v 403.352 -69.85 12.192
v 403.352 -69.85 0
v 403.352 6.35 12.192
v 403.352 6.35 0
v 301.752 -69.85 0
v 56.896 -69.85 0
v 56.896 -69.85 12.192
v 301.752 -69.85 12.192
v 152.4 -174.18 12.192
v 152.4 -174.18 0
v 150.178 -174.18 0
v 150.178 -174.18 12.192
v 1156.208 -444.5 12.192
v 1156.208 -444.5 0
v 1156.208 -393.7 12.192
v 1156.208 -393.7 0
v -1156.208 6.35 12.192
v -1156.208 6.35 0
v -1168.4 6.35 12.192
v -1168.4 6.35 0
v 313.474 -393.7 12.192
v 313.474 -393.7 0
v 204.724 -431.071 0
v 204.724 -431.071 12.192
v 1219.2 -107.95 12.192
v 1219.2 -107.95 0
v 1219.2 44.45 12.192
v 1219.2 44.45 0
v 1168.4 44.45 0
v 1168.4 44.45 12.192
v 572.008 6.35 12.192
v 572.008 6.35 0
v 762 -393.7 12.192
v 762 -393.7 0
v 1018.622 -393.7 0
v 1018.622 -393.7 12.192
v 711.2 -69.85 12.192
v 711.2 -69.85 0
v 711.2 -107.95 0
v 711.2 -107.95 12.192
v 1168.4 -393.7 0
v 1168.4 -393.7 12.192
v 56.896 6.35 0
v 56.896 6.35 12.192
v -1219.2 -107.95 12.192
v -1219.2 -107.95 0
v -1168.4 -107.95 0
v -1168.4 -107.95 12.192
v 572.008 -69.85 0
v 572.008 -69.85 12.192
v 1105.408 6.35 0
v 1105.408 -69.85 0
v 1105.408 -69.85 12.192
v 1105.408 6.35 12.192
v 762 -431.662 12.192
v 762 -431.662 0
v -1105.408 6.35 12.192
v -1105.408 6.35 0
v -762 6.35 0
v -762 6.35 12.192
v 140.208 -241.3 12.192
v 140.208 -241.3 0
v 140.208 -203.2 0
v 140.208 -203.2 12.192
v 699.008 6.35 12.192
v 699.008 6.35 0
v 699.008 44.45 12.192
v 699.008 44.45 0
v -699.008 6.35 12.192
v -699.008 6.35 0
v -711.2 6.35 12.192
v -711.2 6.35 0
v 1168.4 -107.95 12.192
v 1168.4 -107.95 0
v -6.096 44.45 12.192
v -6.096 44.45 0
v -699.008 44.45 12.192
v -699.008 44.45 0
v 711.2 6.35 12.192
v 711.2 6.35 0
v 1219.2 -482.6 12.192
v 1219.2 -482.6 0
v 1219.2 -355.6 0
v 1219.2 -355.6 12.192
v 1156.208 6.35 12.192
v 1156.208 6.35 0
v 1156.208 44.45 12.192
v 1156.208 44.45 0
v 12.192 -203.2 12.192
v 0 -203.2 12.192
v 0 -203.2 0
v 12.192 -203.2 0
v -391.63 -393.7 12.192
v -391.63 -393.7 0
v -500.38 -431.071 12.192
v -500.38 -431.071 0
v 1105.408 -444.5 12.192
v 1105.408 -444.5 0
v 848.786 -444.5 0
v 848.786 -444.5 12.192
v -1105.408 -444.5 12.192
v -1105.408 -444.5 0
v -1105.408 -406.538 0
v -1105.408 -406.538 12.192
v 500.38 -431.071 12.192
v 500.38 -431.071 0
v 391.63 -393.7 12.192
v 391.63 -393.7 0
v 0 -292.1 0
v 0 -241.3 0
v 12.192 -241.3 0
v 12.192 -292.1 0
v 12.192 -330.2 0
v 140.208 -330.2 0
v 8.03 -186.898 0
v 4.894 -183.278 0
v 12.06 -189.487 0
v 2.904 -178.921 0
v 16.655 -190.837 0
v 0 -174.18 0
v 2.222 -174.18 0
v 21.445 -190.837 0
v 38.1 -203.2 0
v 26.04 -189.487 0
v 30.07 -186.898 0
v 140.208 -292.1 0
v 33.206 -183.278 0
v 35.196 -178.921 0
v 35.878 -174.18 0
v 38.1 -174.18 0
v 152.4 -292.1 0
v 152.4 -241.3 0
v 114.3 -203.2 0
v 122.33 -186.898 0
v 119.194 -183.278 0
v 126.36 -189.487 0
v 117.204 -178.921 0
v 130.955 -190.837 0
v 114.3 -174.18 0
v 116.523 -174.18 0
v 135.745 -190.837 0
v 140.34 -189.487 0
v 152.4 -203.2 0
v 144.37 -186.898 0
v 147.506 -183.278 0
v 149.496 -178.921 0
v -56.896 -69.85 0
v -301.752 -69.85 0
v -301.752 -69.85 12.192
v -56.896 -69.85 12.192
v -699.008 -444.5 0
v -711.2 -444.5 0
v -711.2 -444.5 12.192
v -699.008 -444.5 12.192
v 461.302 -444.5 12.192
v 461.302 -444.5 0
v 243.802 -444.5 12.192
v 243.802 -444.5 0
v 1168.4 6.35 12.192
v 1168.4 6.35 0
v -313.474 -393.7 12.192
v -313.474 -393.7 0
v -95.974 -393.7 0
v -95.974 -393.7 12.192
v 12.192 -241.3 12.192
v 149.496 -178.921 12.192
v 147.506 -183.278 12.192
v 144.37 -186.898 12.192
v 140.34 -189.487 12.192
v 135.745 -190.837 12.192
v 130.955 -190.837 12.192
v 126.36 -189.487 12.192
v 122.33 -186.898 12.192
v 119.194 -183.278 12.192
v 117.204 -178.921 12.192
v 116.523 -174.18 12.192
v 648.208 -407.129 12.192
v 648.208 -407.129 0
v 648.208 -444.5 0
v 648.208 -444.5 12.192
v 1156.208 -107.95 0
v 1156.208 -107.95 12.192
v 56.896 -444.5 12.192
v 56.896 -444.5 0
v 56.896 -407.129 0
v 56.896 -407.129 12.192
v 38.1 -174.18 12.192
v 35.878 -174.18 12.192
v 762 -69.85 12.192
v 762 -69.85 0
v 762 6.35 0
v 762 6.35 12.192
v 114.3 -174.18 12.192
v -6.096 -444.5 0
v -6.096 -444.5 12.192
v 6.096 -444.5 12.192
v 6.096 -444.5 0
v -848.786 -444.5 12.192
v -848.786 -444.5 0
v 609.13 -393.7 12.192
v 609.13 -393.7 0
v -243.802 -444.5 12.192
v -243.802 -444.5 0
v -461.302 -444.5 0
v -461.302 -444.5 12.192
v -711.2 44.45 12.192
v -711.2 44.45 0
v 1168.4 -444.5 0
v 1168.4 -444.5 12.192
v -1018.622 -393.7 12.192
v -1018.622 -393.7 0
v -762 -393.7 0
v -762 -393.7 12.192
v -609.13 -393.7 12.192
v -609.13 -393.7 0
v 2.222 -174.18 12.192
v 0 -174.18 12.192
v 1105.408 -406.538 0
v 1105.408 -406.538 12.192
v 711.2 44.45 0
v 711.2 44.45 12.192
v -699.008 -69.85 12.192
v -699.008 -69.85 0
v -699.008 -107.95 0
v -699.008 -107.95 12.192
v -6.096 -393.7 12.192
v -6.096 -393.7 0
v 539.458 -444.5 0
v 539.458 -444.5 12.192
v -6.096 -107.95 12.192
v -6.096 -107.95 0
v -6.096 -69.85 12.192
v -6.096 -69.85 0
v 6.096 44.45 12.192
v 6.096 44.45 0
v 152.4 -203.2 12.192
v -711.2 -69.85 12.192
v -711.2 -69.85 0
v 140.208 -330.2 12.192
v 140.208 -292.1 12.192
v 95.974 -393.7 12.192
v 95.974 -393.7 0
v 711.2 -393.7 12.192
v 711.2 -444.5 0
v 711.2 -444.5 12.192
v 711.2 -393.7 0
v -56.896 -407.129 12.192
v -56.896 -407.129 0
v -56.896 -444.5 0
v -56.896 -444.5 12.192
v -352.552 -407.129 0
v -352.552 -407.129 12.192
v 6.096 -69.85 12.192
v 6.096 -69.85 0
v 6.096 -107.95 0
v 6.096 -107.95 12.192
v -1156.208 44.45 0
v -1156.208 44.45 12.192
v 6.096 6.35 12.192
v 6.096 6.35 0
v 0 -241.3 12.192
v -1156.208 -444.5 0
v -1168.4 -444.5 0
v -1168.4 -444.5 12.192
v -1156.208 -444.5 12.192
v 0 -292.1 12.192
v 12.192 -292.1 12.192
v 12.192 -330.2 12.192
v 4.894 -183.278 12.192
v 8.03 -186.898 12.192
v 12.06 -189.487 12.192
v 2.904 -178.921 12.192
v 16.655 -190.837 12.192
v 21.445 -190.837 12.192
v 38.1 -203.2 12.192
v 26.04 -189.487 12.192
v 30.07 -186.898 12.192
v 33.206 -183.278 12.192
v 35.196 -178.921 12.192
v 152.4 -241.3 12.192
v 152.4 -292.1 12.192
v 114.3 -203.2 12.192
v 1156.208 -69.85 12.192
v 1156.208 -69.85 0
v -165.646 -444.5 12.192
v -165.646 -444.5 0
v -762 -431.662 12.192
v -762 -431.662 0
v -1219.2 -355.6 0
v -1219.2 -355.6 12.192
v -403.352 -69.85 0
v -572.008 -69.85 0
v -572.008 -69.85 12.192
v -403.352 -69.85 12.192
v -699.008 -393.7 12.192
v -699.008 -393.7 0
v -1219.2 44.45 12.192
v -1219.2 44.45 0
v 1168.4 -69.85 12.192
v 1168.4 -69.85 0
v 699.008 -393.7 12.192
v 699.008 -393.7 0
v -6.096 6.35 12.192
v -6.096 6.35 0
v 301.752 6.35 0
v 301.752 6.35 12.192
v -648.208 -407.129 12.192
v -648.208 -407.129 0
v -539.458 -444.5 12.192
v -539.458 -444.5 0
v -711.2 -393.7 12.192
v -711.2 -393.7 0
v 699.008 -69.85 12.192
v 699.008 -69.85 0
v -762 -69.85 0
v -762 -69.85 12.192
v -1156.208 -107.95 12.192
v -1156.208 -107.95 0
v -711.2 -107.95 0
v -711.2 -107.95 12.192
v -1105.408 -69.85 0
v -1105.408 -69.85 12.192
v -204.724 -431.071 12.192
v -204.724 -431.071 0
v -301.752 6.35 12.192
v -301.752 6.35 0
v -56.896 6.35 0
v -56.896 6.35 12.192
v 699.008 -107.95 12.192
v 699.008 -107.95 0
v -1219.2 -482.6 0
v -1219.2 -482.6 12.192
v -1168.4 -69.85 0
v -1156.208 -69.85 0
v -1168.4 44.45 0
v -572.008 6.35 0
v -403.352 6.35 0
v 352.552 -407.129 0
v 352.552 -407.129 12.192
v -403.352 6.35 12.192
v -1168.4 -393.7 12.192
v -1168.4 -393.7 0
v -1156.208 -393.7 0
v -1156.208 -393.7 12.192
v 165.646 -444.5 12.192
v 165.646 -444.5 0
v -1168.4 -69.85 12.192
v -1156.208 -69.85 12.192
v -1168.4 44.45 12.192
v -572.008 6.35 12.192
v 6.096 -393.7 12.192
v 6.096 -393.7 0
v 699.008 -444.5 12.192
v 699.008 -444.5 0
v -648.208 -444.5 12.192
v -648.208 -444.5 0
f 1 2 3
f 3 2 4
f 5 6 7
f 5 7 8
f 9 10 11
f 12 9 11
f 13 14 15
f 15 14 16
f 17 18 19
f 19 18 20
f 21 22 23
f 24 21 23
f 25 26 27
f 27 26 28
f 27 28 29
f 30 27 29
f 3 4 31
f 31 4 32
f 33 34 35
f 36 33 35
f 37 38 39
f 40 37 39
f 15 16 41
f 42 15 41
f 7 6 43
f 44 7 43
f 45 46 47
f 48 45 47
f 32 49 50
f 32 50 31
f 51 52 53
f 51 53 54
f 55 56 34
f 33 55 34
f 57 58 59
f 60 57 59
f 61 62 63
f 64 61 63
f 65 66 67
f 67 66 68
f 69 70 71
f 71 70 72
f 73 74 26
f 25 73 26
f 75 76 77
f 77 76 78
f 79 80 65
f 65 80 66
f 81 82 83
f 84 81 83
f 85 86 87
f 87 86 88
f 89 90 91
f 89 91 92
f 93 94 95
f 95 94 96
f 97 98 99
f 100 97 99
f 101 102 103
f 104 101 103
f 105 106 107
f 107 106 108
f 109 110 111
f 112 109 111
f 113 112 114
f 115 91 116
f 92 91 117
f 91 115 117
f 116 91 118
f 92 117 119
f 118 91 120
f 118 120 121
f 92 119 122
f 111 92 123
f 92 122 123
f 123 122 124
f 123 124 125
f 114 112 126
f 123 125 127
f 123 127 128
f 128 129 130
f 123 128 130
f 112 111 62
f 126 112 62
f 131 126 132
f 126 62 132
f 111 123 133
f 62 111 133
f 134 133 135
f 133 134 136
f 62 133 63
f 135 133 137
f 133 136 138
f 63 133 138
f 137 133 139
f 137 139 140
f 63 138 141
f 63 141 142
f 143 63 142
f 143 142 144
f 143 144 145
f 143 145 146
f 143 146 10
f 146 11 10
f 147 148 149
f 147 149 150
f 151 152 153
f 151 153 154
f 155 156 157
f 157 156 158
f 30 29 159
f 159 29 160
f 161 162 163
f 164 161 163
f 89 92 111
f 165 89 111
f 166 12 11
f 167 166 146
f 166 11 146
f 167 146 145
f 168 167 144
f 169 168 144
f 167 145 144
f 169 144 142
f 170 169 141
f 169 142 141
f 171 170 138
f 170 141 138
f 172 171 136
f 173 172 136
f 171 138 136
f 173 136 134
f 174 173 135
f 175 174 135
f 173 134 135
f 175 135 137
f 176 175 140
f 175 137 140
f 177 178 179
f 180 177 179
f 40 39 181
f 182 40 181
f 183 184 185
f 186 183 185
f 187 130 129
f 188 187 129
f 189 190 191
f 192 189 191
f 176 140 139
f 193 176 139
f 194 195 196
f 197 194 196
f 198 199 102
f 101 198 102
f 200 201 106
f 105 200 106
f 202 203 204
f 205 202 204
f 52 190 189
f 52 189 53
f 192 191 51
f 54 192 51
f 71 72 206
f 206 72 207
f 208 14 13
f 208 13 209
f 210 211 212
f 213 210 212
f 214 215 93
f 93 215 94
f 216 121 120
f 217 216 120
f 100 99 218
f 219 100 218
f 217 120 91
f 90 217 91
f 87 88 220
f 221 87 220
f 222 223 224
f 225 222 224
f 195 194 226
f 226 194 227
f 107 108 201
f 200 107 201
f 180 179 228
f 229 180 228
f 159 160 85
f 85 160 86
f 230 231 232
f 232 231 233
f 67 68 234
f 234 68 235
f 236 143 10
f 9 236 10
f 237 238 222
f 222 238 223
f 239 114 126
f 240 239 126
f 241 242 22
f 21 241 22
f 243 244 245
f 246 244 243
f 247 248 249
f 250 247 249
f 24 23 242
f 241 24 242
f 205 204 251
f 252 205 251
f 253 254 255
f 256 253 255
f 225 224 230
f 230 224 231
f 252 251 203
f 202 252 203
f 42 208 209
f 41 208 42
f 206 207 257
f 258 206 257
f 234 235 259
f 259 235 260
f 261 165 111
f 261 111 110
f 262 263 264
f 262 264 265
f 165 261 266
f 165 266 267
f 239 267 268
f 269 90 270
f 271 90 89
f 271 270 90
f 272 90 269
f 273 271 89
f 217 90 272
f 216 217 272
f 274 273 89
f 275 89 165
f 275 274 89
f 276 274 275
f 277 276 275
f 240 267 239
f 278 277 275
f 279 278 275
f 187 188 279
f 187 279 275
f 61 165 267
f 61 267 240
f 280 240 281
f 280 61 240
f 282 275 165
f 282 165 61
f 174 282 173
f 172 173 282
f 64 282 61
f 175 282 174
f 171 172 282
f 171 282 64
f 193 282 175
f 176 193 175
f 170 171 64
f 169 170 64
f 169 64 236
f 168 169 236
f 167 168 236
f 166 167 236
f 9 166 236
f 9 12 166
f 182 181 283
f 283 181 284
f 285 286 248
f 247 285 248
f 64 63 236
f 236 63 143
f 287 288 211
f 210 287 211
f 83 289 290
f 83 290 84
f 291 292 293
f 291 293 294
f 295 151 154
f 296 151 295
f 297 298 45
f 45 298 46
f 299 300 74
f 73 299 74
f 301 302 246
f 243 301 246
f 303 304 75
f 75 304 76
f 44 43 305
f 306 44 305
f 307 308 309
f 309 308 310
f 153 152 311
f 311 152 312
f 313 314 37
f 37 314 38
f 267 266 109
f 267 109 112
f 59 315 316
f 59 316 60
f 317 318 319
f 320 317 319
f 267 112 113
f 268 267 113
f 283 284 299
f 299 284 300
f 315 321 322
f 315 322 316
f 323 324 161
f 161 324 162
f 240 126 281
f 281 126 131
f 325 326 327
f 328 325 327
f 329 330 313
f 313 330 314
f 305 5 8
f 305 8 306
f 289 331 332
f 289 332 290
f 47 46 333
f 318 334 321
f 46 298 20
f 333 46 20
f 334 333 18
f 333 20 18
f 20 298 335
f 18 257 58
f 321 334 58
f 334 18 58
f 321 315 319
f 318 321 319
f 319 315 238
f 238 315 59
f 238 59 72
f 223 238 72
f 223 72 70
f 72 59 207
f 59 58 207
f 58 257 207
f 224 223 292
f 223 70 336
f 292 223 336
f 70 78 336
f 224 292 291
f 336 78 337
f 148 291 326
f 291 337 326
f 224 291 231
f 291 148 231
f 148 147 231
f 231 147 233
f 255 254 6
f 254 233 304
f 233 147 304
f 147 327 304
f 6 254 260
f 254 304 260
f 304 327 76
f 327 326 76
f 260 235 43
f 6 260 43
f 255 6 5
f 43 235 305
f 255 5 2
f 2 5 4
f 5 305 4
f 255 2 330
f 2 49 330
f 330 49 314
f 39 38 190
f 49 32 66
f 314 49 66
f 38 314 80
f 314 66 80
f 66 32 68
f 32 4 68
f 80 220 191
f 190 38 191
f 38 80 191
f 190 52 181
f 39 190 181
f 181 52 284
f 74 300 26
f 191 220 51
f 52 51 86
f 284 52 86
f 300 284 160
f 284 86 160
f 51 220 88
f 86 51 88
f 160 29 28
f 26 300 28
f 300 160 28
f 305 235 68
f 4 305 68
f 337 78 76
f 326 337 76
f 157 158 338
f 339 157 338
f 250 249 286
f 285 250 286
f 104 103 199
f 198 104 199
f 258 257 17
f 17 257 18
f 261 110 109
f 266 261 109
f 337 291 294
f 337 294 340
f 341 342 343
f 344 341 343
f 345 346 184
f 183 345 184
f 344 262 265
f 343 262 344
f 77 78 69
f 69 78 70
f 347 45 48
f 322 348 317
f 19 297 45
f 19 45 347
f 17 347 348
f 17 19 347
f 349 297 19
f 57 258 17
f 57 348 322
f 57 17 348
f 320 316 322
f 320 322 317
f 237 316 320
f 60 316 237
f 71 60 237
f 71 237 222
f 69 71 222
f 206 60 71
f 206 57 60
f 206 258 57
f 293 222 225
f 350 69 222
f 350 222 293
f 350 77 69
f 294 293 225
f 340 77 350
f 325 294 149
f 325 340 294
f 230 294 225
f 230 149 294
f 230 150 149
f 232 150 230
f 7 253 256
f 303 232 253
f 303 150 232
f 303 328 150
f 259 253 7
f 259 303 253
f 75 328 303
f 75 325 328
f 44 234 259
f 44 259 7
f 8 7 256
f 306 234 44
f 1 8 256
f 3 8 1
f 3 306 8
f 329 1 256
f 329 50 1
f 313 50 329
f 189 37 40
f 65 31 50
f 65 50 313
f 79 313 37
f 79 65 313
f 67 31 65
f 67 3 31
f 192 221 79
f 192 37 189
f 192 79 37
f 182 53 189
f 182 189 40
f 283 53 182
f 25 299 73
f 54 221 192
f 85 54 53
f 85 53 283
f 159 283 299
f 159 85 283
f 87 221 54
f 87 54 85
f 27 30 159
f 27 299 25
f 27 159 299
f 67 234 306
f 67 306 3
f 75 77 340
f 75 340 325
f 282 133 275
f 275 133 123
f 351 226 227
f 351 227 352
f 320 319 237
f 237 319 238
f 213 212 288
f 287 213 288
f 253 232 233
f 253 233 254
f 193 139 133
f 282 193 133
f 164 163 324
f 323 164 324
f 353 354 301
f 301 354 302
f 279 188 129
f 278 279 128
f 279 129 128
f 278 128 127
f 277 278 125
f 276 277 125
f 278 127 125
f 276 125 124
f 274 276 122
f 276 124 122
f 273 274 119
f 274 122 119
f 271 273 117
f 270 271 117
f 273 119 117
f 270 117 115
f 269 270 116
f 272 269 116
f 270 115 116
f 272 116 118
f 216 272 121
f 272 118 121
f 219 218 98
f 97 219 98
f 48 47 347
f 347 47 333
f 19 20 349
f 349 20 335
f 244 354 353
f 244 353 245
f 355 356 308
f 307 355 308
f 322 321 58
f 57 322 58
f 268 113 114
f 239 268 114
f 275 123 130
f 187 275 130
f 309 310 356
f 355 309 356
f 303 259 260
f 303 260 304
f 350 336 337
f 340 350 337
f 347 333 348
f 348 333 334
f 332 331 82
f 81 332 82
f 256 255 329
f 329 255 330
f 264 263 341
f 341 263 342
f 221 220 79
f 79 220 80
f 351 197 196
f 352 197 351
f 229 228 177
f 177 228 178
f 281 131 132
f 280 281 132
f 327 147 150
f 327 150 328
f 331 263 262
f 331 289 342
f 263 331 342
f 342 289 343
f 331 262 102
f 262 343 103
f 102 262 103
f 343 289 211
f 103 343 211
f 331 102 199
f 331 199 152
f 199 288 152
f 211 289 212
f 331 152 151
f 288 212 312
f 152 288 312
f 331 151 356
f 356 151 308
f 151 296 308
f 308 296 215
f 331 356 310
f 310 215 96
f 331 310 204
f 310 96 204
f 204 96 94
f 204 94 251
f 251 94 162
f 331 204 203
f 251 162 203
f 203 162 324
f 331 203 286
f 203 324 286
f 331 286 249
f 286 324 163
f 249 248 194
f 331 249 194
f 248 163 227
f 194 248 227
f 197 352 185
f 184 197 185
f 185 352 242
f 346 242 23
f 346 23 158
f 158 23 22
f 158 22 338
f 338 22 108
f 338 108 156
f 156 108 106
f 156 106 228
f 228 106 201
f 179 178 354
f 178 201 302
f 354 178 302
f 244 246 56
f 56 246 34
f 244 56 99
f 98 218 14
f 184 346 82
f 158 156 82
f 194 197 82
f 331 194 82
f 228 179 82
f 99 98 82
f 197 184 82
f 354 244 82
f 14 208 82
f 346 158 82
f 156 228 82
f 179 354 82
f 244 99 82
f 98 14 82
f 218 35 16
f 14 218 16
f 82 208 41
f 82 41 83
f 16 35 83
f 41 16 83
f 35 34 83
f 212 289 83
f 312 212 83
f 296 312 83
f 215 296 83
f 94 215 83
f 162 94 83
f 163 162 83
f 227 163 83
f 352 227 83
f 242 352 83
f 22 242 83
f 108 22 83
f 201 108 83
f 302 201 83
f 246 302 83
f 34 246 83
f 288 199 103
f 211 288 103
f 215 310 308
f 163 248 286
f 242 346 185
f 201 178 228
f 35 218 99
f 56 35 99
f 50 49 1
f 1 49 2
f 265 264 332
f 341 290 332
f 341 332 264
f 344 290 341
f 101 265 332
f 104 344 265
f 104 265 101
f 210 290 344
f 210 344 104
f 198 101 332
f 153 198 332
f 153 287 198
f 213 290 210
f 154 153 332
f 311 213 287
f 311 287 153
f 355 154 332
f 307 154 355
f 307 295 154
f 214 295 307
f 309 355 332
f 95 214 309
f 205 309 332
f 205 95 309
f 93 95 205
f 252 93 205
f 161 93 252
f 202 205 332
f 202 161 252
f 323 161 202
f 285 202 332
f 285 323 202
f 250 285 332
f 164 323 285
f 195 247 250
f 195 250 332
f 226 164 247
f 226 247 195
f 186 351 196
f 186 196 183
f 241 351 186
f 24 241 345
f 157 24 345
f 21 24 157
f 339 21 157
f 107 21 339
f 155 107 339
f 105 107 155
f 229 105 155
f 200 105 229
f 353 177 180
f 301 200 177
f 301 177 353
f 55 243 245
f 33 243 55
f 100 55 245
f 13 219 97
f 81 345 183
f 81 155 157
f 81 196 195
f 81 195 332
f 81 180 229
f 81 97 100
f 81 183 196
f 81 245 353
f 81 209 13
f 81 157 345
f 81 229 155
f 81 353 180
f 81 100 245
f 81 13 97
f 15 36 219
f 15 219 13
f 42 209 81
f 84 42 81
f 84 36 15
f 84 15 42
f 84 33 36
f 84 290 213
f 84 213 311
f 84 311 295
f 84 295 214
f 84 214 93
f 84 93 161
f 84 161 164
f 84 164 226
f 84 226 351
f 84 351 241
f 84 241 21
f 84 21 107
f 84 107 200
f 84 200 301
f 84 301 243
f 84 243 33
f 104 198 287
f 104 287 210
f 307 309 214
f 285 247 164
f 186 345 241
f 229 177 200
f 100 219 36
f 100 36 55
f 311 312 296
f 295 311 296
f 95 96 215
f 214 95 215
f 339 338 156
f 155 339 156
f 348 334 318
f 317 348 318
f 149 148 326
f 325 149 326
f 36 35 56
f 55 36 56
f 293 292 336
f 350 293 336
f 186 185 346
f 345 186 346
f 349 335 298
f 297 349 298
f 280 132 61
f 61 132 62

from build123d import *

# Parameters (mm, degrees)
F0_W     = 343.408
F0_H     = 76.2
F0_W_2   = 168.656
F0_W_3   = 244.856
F0_W_4   = 2438.4
F0_H_2   = 127
F0_W_5   = 12.192
F0_H_3   = 50.8
F0_W_6   = 76.2
F1_DEPTH = 12.192


with BuildPart() as f1:
    # F0 (on Top) → F1 (new body)
    with BuildSketch(Plane.XY):
        Polygon((-1168.4, 44.45), (-1219.2, 44.45), (-1219.2, -107.95), (-1168.4, -107.95), (-1168.4, -69.85), (-1156.208, -69.85), (-1156.208, -107.95), (-711.2, -107.95), (-711.2, -69.85), (-699.008, -69.85), (-699.008, -107.95), (-6.096, -107.95), (-6.096, -69.85), (6.096, -69.85), (6.096, -107.95), (699.008, -107.95), (699.008, -69.85), (711.2, -69.85), (711.2, -107.95), (1156.208, -107.95), (1156.208, -69.85), (1168.4, -69.85), (1168.4, -107.95), (1219.2, -107.95), (1219.2, 44.45), (1168.4, 44.45), (1168.4, 6.35), (1156.208, 6.35), (1156.208, 44.45), (711.2, 44.45), (711.2, 6.35), (699.008, 6.35), (699.008, 44.45), (6.096, 44.45), (6.096, 6.35), (-6.096, 6.35), (-6.096, 44.45), (-699.008, 44.45), (-699.008, 6.35), (-711.2, 6.35), (-711.2, 44.45), (-1156.208, 44.45), (-1156.208, 6.35), (-1168.4, 6.35), align=None)
        with Locations((-933.704, -31.75)):
            Rectangle(F0_W, F0_H, mode=Mode.SUBTRACT)
        with Locations((-487.68, -31.75)):
            Rectangle(F0_W_2, F0_H, mode=Mode.SUBTRACT)
        with Locations((-179.324, -31.75)):
            Rectangle(F0_W_3, F0_H, mode=Mode.SUBTRACT)
        with Locations((179.324, -31.75)):
            Rectangle(F0_W_3, F0_H, mode=Mode.SUBTRACT)
        Polygon((572.008, 6.35), (648.208, 6.35), (648.208, -69.85), (572.008, -69.85), (403.352, -69.85), (403.352, 6.35), align=None, mode=Mode.SUBTRACT)
        with Locations((933.704, -31.75)):
            Rectangle(F0_W, F0_H, mode=Mode.SUBTRACT)
        with BuildLine():
            Line((114.3, -203.2), (38.1, -203.2))
            Line((38.1, -203.2), (38.1, -174.1805))
            Line((38.1, -174.1805), (35.8775, -174.1805))
            ThreePointArc((35.8775, -174.1805), (19.05, -191.008), (2.2225, -174.1805))
            Line((2.2225, -174.1805), (0, -174.1805))
            Line((0, -174.1805), (0, -203.2))
            Line((0, -203.2), (12.192, -203.2))
            Line((12.192, -203.2), (12.192, -241.3))
            Line((12.192, -241.3), (0, -241.3))
            Line((0, -241.3), (0, -292.1))
            Line((0, -292.1), (12.192, -292.1))
            Line((12.192, -292.1), (12.192, -330.2))
            Line((12.192, -330.2), (140.208, -330.2))
            Line((140.208, -330.2), (140.208, -292.1))
            Line((140.208, -292.1), (152.4, -292.1))
            Line((152.4, -292.1), (152.4, -241.3))
            Line((152.4, -241.3), (140.208, -241.3))
            Line((140.208, -241.3), (140.208, -203.2))
            Line((140.208, -203.2), (152.4, -203.2))
            Line((152.4, -203.2), (152.4, -174.1805))
            Line((152.4, -174.1805), (150.1775, -174.1805))
            ThreePointArc((150.1775, -174.1805), (133.35, -191.008), (116.5225, -174.1805))
            Line((116.5225, -174.1805), (114.3, -174.1805))
            Line((114.3, -174.1805), (114.3, -203.2))
        make_face()
        with Locations((0, -419.1)):
            Rectangle(F0_W_4, F0_H_2)
        with Locations((-1162.304, -419.1)):
            Rectangle(F0_W_5, F0_H_3, mode=Mode.SUBTRACT)
        Polygon((-1105.408, -406.538205), (-848.786266, -444.5), (-1105.408, -444.5), align=None, mode=Mode.SUBTRACT)
        Polygon((-762, -431.661795), (-1018.621734, -393.7), (-762, -393.7), align=None, mode=Mode.SUBTRACT)
        with Locations((-705.104, -419.1)):
            Rectangle(F0_W_5, F0_H_3, mode=Mode.SUBTRACT)
        Polygon((-648.208, -444.5), (-648.208, -407.128953), (-539.458253, -444.5), align=None, mode=Mode.SUBTRACT)
        Polygon((-500.38, -431.071047), (-609.129747, -393.7), (-391.630253, -393.7), align=None, mode=Mode.SUBTRACT)
        Polygon((-243.802253, -444.5), (-352.552, -444.5), (-461.301747, -444.5), (-352.552, -407.128953), align=None, mode=Mode.SUBTRACT)
        Polygon((-313.473747, -393.7), (-95.974253, -393.7), (-204.724, -431.071047), align=None, mode=Mode.SUBTRACT)
        Polygon((-56.896, -407.128953), (-56.896, -444.5), (-165.645747, -444.5), align=None, mode=Mode.SUBTRACT)
        with Locations((0, -419.1)):
            Rectangle(F0_W_5, F0_H_3, mode=Mode.SUBTRACT)
        Polygon((165.645747, -444.5), (56.896, -444.5), (56.896, -407.128953), align=None, mode=Mode.SUBTRACT)
        Polygon((95.974253, -393.7), (313.473747, -393.7), (204.724, -431.071047), align=None, mode=Mode.SUBTRACT)
        Polygon((352.552, -407.128953), (461.301747, -444.5), (352.552, -444.5), (243.802253, -444.5), align=None, mode=Mode.SUBTRACT)
        Polygon((609.129747, -393.7), (500.38, -431.071047), (391.630253, -393.7), align=None, mode=Mode.SUBTRACT)
        Polygon((648.208, -407.128953), (648.208, -444.5), (539.458253, -444.5), align=None, mode=Mode.SUBTRACT)
        with Locations((705.104, -419.1)):
            Rectangle(F0_W_5, F0_H_3, mode=Mode.SUBTRACT)
        Polygon((762, -393.7), (1018.621734, -393.7), (762, -431.661795), align=None, mode=Mode.SUBTRACT)
        Polygon((848.786266, -444.5), (1105.408, -406.538205), (1105.408, -444.5), align=None, mode=Mode.SUBTRACT)
        with Locations((1162.304, -419.1)):
            Rectangle(F0_W_5, F0_H_3, mode=Mode.SUBTRACT)
        with Locations((610.108, -31.75)):
            Rectangle(F0_W_6, F0_H)
    extrude(amount=F1_DEPTH)


solid = f1.part
